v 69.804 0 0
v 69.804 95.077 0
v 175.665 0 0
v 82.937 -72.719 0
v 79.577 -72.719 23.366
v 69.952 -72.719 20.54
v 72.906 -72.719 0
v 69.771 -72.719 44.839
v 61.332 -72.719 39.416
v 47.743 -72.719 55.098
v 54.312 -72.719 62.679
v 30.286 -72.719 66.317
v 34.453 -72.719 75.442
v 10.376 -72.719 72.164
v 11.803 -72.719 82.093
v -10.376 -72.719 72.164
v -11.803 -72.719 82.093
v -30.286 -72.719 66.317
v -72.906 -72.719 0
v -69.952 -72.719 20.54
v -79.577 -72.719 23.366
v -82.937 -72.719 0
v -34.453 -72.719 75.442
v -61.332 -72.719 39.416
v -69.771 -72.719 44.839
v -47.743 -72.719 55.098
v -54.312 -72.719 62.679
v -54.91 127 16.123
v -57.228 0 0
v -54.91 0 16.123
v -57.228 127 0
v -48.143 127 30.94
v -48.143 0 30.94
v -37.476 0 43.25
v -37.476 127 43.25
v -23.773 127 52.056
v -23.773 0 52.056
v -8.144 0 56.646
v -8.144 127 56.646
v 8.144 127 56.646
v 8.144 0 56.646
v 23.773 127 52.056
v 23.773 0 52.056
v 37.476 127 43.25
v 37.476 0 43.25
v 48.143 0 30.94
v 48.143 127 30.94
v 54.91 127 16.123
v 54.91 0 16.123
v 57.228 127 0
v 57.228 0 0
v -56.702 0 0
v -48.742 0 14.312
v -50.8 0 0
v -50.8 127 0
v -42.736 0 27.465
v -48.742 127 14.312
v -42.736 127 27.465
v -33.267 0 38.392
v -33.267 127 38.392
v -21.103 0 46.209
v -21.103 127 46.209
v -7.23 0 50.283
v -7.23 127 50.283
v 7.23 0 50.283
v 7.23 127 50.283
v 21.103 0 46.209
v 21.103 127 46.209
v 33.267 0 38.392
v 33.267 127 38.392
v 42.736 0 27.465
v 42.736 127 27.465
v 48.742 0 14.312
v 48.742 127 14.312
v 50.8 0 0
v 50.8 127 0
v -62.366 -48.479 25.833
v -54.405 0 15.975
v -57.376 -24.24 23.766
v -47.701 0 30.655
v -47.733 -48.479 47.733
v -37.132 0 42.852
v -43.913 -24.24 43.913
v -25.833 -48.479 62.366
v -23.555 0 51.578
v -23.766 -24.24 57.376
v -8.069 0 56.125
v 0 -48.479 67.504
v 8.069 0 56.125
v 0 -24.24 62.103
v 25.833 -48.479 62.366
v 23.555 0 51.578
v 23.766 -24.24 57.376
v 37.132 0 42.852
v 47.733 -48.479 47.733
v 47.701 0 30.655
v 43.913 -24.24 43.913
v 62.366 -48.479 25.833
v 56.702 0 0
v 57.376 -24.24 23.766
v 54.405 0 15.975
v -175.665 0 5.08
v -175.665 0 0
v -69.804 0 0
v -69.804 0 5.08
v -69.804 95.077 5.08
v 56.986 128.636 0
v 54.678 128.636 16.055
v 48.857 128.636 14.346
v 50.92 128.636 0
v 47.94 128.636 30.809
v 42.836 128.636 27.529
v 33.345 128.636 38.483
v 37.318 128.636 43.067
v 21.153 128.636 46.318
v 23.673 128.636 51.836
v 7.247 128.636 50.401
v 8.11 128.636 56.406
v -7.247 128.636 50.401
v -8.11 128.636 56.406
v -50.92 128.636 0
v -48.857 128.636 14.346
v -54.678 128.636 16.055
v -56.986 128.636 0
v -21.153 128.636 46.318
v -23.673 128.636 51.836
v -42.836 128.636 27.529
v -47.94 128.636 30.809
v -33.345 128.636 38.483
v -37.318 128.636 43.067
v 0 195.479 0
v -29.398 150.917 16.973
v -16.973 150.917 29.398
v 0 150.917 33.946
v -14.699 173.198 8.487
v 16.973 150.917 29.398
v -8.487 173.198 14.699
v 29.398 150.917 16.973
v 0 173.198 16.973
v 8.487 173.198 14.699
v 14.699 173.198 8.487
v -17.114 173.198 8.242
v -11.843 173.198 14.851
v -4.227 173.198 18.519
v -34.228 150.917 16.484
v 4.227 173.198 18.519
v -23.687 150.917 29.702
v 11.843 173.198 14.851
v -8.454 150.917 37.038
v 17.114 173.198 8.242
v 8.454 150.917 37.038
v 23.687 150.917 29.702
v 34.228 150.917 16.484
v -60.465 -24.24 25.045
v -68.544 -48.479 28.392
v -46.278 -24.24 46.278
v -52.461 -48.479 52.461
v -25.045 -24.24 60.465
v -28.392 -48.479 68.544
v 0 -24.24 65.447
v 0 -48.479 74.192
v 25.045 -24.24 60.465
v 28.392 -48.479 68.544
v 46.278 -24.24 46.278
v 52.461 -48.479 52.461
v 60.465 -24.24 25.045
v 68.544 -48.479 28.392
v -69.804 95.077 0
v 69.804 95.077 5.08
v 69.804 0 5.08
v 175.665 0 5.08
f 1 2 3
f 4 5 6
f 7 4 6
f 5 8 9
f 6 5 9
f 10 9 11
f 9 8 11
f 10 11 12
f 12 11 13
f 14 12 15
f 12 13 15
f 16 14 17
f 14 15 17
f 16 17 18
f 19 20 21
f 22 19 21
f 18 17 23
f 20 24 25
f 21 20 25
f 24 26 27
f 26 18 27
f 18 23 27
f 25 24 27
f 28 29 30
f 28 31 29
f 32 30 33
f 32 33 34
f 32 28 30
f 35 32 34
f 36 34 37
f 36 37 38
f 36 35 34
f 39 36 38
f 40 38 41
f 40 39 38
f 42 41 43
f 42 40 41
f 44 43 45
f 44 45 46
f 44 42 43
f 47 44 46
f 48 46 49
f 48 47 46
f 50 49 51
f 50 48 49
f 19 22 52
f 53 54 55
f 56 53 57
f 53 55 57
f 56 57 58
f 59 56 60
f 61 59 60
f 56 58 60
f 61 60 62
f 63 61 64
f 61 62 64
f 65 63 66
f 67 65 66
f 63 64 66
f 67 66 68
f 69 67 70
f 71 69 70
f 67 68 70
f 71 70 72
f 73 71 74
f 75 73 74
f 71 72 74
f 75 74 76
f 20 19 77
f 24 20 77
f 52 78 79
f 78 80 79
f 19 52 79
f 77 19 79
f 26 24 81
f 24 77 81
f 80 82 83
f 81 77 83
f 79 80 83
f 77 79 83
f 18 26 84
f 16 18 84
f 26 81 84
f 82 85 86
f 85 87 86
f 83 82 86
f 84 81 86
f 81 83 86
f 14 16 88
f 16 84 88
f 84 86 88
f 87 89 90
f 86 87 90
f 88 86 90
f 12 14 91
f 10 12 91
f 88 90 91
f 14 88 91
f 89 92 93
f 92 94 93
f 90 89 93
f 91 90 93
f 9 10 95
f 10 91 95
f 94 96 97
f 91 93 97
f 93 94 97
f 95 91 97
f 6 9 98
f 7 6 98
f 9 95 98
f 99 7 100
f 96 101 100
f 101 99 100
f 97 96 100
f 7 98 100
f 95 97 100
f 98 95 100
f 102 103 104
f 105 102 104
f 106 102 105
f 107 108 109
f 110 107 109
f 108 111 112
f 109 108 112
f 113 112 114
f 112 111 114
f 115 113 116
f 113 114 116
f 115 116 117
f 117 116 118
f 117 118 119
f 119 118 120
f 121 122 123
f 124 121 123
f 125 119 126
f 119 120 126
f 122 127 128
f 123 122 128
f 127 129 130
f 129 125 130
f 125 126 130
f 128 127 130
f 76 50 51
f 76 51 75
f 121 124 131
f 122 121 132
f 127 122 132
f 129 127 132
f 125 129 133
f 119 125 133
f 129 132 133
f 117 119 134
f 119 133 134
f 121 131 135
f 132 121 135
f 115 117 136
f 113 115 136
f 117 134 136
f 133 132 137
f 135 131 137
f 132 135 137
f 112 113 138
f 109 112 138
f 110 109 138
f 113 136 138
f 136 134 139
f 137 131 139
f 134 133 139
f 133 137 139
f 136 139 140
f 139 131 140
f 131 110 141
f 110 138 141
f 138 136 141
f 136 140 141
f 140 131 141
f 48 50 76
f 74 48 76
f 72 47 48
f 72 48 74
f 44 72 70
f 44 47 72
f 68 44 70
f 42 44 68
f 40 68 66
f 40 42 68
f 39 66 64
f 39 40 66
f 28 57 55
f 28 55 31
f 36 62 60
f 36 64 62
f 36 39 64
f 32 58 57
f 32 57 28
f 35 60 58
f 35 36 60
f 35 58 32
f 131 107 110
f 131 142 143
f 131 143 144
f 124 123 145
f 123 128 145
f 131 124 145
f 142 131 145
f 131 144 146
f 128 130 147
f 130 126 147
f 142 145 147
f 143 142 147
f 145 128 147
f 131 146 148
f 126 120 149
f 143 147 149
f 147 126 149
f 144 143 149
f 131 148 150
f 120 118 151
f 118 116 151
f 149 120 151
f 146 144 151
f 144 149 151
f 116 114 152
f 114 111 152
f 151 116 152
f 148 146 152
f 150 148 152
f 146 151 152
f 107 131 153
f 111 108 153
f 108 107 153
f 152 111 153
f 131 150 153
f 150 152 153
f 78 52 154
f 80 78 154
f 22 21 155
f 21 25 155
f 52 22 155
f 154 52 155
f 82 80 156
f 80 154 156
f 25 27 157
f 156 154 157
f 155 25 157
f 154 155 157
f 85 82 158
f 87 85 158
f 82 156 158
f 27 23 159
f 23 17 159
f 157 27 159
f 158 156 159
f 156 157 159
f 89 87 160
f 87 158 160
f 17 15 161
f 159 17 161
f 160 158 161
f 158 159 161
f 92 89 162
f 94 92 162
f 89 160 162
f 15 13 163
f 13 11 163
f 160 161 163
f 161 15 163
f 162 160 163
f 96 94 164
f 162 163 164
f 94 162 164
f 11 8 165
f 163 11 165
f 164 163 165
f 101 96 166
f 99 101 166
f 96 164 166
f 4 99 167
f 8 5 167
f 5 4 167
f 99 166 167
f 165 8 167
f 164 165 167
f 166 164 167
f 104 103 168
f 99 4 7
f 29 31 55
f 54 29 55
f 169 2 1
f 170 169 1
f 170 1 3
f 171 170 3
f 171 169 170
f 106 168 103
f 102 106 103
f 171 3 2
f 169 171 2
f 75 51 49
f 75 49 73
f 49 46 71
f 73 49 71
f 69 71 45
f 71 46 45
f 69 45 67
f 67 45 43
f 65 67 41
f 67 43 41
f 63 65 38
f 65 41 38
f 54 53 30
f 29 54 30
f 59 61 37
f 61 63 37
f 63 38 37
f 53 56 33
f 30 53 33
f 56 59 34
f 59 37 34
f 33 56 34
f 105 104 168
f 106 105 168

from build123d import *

# Parameters (mm, degrees)
F0_W     = 6.428055
F0_H     = 127
F1_ANGLE = 180
F4_ANGLE = -180
F6_ANGLE = -180
F7_DEPTH = 5.08


with BuildPart() as f1:
    # F0 (on Top) → F1 (revolve)
    with BuildSketch(Plane.XY):
        with Locations((-54.014027, 63.5)):
            Rectangle(F0_W, F0_H)
    revolve(axis=Axis((0, 11.776872, 0), (0, 1, 0)), revolution_arc=F1_ANGLE)


with BuildPart() as f4:
    # F3 (on Top) → F4 (revolve)
    with BuildSketch(Plane.XY):
        Polygon((0, 195.478752), (-56.985948, 128.63642), (-50.919659, 128.63642), align=None)
    revolve(axis=Axis((0, 172.260292, 0), (0, -1, 0)), revolution_arc=F4_ANGLE)


with BuildPart() as f6:
    # F5 (on Top) → F6 (revolve)
    with BuildSketch(Plane.XY):
        Polygon((-72.905682, -72.71868), (-56.701727, 0), (-82.936764, -72.71868), align=None)
    revolve(axis=Axis((0, -10.314184, 0), (0, -1, 0)), revolution_arc=F6_ANGLE)


with BuildPart() as f7:
    # F2 (on Top) → F7 (new body)
    with BuildSketch(Plane.XY):
        Polygon((-175.665453, 0), (-69.804244, 0), (-69.804244, 95.076967), align=None)
        Polygon((69.804244, 95.076967), (69.804244, 0), (175.665453, 0), align=None)
    extrude(amount=F7_DEPTH)


solid = Compound([f1.part, f4.part, f6.part, f7.part])
